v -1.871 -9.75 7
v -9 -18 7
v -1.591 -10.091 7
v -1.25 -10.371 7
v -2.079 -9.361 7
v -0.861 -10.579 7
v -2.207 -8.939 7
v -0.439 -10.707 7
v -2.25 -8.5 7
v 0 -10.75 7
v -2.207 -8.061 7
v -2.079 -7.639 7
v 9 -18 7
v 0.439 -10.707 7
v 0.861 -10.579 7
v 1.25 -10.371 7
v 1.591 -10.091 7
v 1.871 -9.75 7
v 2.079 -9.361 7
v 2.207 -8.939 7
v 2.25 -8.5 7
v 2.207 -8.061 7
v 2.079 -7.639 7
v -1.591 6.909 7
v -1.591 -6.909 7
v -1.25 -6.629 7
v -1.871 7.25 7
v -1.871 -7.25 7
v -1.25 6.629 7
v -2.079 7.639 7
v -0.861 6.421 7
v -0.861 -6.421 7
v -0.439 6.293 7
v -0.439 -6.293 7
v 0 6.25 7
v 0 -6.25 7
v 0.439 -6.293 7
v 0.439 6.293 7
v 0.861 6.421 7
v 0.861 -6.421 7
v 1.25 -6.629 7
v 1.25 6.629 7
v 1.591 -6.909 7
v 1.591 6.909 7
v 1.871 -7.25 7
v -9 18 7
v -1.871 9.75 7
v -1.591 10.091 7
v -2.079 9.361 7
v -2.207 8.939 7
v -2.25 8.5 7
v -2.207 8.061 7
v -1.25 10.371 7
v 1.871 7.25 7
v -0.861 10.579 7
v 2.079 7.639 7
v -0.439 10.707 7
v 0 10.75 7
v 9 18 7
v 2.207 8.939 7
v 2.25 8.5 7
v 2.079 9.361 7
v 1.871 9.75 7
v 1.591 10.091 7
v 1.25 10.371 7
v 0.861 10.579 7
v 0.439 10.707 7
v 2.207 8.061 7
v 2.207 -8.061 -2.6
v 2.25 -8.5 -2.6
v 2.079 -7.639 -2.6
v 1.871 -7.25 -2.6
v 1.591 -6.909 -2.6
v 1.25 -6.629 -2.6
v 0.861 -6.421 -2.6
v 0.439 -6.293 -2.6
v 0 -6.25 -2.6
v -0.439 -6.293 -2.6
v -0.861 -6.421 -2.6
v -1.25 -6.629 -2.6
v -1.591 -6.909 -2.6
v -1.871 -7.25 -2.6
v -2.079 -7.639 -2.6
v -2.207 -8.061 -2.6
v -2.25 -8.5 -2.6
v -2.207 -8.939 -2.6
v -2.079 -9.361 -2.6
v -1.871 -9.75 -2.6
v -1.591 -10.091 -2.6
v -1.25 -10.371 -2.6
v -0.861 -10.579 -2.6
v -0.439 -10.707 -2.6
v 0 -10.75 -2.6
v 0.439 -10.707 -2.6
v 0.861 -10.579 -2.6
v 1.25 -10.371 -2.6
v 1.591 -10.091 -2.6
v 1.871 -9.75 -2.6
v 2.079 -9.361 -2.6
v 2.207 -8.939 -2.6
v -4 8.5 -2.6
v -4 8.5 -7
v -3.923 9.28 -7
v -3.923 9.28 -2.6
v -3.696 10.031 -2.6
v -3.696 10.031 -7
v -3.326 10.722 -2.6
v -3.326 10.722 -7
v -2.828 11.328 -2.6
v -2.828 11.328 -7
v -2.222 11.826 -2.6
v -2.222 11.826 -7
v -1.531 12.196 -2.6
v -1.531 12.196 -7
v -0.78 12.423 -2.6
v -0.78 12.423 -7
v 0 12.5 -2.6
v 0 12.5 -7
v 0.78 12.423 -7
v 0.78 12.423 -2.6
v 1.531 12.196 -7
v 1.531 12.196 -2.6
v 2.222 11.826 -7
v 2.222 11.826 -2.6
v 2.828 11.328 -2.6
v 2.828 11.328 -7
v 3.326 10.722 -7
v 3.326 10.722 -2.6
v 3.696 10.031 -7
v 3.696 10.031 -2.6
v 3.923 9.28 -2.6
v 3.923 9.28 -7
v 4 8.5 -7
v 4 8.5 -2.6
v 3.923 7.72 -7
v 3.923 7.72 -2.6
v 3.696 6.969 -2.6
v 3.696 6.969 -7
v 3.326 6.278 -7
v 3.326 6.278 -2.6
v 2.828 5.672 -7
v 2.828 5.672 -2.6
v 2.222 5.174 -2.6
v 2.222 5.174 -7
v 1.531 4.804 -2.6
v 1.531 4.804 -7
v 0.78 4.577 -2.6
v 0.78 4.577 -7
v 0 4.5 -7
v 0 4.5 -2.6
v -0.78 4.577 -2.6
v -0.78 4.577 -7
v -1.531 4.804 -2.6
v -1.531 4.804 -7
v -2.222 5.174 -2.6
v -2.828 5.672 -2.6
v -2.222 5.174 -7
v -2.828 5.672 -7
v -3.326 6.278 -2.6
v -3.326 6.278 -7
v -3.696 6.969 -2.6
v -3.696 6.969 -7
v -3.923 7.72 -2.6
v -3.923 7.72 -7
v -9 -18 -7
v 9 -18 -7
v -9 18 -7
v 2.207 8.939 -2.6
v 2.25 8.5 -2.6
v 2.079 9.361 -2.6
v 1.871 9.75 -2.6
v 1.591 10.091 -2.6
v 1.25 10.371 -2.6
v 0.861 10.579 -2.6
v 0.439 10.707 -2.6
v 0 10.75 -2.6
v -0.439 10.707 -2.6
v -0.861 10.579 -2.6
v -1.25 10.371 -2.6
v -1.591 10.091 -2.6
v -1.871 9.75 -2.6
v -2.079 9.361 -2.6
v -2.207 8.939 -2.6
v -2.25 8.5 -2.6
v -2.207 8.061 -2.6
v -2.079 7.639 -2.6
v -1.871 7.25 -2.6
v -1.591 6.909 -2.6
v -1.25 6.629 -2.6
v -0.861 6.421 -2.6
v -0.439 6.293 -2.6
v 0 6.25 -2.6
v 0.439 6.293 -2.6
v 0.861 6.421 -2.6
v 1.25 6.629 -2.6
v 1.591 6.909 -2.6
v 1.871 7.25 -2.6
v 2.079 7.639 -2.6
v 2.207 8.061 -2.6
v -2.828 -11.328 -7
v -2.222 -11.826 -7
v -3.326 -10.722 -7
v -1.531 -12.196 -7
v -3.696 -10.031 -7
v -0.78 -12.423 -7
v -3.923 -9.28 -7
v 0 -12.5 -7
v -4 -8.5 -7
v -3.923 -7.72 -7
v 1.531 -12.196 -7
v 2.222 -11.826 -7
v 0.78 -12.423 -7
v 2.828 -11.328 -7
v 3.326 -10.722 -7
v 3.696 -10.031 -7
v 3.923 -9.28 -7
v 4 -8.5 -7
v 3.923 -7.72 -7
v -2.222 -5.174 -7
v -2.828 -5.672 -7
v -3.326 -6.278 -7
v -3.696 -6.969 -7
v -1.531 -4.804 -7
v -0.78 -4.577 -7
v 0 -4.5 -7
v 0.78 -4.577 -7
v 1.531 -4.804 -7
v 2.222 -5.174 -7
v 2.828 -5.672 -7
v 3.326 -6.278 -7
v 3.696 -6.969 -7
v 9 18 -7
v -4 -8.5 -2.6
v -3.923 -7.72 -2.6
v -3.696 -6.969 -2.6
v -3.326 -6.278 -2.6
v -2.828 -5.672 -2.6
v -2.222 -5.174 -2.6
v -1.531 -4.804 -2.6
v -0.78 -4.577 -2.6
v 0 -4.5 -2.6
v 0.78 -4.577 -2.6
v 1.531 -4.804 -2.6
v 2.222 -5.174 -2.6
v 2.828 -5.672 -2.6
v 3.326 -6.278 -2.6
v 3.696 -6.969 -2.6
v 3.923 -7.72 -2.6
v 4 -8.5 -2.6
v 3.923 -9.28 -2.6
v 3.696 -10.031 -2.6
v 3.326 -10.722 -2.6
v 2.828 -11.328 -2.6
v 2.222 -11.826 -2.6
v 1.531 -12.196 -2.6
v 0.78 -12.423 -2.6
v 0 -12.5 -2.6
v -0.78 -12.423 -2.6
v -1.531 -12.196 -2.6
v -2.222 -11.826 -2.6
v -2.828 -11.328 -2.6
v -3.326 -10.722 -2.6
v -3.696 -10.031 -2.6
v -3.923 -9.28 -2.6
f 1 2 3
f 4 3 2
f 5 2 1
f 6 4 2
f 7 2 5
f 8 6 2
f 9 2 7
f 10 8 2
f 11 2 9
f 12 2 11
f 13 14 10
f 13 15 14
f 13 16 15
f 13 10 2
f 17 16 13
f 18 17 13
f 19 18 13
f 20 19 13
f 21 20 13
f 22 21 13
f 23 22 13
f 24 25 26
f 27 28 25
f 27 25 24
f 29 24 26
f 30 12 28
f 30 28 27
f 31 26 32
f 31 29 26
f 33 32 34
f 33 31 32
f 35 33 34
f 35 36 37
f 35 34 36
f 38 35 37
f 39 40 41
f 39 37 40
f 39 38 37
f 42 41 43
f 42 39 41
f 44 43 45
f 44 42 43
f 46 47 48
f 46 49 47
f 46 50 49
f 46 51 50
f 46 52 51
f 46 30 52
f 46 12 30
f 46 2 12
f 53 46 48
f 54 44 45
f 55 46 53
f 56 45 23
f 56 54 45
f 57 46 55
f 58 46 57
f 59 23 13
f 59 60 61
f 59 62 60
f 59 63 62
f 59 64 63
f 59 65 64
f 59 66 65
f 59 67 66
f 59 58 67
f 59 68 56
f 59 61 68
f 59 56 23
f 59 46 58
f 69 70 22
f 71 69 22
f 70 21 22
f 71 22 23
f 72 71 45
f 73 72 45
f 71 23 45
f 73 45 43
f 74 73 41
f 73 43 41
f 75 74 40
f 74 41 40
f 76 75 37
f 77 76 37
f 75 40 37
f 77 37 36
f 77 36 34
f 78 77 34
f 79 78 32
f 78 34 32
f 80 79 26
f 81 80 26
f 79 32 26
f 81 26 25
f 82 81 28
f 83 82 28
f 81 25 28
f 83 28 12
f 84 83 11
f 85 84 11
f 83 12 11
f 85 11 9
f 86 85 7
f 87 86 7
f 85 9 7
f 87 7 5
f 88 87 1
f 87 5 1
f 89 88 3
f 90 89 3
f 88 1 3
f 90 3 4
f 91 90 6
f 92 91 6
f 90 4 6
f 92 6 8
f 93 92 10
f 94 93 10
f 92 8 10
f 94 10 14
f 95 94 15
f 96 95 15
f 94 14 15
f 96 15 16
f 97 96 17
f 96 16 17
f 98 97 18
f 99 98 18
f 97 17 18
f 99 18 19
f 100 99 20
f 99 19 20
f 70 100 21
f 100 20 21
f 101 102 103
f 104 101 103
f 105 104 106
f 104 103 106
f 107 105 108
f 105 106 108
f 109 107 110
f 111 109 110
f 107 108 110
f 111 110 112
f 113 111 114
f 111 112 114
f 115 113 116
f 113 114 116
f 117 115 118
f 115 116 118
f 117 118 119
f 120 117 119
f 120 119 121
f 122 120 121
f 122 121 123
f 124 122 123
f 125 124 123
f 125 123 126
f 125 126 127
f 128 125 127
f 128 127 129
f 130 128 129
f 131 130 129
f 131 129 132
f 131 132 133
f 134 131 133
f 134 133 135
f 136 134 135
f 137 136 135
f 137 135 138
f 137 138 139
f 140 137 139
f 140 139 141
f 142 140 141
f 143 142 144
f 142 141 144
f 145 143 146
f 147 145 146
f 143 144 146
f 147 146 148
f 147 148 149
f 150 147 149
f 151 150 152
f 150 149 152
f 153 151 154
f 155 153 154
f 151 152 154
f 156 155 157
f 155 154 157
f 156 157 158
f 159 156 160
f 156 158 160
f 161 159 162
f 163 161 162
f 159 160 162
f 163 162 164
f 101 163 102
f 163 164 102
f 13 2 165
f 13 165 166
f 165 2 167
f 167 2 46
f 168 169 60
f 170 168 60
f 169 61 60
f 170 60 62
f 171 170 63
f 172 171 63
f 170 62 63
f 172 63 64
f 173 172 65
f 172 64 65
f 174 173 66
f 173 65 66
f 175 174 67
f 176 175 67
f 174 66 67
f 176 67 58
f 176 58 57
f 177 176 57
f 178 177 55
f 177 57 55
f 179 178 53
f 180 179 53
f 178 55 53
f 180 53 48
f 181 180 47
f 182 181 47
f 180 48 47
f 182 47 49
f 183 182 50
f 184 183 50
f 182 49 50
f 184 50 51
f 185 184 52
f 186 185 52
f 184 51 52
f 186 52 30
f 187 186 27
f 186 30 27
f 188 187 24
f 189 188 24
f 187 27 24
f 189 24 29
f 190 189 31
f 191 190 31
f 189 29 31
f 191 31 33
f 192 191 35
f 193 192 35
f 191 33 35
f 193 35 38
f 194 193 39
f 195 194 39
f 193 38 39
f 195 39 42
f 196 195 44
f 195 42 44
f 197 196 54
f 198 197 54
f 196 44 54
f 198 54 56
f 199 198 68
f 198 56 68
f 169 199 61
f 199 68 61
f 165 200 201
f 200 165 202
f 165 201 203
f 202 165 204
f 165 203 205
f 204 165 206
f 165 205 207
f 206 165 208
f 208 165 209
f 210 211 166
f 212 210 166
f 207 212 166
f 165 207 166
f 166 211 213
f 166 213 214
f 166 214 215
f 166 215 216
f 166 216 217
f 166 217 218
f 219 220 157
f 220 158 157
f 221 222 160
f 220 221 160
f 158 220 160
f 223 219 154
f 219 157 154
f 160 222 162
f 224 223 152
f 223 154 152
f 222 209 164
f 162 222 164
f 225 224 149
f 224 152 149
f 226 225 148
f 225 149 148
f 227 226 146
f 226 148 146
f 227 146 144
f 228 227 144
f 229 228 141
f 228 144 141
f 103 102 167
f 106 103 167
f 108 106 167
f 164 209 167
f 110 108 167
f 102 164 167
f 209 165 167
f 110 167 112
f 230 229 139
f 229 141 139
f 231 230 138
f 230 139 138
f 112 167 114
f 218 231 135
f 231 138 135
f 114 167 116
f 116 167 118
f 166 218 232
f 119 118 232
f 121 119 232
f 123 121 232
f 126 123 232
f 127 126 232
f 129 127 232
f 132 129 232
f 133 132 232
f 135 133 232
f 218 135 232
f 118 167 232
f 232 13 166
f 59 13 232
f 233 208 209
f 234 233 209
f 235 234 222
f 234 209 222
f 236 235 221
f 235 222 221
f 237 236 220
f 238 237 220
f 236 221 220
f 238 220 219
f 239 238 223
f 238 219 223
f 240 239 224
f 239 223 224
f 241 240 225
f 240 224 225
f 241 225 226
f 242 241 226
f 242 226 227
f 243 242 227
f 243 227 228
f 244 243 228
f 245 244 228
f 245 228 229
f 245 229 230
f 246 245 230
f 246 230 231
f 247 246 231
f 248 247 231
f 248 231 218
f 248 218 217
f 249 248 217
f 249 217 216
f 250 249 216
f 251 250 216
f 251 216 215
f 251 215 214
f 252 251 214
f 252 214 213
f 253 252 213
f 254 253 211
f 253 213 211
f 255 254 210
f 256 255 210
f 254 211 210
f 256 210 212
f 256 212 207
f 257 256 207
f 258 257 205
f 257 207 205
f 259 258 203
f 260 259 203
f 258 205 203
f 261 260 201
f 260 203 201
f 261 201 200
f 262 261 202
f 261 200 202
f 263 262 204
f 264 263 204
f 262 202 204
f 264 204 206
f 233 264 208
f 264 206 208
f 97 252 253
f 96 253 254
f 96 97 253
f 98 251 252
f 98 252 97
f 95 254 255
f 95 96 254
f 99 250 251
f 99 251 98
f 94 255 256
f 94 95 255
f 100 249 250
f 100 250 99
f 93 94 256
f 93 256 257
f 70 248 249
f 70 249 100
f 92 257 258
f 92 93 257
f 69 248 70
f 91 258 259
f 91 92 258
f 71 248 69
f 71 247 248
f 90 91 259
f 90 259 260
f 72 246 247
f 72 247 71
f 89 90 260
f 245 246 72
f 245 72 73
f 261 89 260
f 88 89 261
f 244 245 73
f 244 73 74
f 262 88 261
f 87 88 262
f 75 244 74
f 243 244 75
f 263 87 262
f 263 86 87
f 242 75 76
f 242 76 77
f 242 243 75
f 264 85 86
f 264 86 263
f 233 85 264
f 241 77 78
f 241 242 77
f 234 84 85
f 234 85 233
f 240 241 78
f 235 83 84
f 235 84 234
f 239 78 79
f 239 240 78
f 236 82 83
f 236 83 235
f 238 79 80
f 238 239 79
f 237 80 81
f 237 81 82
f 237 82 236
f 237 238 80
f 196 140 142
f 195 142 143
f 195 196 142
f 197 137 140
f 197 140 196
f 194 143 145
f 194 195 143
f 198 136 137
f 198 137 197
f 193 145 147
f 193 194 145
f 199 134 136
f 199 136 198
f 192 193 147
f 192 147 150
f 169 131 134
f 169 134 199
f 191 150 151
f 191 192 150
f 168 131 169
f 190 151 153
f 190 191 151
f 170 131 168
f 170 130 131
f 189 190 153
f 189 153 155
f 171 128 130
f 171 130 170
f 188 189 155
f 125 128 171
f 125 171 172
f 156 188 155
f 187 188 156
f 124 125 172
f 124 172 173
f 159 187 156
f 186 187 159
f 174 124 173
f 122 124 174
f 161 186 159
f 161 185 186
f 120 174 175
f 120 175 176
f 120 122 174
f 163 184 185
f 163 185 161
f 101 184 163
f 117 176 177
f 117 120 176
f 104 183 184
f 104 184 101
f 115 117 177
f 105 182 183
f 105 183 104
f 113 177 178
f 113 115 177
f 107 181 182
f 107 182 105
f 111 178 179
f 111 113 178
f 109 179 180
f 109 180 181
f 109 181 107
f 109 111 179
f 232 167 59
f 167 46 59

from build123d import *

# Parameters (mm, degrees)
ESQUISSE1_W                                        = 18
ESQUISSE1_H                                        = 36
BOSS_EXTRU_1_DEPTH                                 = 7
CHAMBRAGE_POUR_VIS_T_TE_HEXAGONALE_M41_D           = 4.5
CHAMBRAGE_POUR_VIS_T_TE_HEXAGONALE_M41_CBORE_D     = 8
CHAMBRAGE_POUR_VIS_T_TE_HEXAGONALE_M41_CBORE_DEPTH = 4.4


with BuildPart() as part:
    # Esquisse1 → Boss.-Extru.1 (new body, symmetric)
    with BuildSketch(Plane.XY):
        Rectangle(ESQUISSE1_W, ESQUISSE1_H)
    extrude(amount=BOSS_EXTRU_1_DEPTH, both=True)

    # Chambrage pour vis à tête hexagonale M41 (through all)
    with Locations(Plane(origin=(0, 0, -7), x_dir=(-1, 0, 0), z_dir=(0, 0, -1))):
        with Locations((0, 8.5), (0, -8.5)):
            CounterBoreHole(CHAMBRAGE_POUR_VIS_T_TE_HEXAGONALE_M41_D / 2, CHAMBRAGE_POUR_VIS_T_TE_HEXAGONALE_M41_CBORE_D / 2, CHAMBRAGE_POUR_VIS_T_TE_HEXAGONALE_M41_CBORE_DEPTH)


solid = part.part
